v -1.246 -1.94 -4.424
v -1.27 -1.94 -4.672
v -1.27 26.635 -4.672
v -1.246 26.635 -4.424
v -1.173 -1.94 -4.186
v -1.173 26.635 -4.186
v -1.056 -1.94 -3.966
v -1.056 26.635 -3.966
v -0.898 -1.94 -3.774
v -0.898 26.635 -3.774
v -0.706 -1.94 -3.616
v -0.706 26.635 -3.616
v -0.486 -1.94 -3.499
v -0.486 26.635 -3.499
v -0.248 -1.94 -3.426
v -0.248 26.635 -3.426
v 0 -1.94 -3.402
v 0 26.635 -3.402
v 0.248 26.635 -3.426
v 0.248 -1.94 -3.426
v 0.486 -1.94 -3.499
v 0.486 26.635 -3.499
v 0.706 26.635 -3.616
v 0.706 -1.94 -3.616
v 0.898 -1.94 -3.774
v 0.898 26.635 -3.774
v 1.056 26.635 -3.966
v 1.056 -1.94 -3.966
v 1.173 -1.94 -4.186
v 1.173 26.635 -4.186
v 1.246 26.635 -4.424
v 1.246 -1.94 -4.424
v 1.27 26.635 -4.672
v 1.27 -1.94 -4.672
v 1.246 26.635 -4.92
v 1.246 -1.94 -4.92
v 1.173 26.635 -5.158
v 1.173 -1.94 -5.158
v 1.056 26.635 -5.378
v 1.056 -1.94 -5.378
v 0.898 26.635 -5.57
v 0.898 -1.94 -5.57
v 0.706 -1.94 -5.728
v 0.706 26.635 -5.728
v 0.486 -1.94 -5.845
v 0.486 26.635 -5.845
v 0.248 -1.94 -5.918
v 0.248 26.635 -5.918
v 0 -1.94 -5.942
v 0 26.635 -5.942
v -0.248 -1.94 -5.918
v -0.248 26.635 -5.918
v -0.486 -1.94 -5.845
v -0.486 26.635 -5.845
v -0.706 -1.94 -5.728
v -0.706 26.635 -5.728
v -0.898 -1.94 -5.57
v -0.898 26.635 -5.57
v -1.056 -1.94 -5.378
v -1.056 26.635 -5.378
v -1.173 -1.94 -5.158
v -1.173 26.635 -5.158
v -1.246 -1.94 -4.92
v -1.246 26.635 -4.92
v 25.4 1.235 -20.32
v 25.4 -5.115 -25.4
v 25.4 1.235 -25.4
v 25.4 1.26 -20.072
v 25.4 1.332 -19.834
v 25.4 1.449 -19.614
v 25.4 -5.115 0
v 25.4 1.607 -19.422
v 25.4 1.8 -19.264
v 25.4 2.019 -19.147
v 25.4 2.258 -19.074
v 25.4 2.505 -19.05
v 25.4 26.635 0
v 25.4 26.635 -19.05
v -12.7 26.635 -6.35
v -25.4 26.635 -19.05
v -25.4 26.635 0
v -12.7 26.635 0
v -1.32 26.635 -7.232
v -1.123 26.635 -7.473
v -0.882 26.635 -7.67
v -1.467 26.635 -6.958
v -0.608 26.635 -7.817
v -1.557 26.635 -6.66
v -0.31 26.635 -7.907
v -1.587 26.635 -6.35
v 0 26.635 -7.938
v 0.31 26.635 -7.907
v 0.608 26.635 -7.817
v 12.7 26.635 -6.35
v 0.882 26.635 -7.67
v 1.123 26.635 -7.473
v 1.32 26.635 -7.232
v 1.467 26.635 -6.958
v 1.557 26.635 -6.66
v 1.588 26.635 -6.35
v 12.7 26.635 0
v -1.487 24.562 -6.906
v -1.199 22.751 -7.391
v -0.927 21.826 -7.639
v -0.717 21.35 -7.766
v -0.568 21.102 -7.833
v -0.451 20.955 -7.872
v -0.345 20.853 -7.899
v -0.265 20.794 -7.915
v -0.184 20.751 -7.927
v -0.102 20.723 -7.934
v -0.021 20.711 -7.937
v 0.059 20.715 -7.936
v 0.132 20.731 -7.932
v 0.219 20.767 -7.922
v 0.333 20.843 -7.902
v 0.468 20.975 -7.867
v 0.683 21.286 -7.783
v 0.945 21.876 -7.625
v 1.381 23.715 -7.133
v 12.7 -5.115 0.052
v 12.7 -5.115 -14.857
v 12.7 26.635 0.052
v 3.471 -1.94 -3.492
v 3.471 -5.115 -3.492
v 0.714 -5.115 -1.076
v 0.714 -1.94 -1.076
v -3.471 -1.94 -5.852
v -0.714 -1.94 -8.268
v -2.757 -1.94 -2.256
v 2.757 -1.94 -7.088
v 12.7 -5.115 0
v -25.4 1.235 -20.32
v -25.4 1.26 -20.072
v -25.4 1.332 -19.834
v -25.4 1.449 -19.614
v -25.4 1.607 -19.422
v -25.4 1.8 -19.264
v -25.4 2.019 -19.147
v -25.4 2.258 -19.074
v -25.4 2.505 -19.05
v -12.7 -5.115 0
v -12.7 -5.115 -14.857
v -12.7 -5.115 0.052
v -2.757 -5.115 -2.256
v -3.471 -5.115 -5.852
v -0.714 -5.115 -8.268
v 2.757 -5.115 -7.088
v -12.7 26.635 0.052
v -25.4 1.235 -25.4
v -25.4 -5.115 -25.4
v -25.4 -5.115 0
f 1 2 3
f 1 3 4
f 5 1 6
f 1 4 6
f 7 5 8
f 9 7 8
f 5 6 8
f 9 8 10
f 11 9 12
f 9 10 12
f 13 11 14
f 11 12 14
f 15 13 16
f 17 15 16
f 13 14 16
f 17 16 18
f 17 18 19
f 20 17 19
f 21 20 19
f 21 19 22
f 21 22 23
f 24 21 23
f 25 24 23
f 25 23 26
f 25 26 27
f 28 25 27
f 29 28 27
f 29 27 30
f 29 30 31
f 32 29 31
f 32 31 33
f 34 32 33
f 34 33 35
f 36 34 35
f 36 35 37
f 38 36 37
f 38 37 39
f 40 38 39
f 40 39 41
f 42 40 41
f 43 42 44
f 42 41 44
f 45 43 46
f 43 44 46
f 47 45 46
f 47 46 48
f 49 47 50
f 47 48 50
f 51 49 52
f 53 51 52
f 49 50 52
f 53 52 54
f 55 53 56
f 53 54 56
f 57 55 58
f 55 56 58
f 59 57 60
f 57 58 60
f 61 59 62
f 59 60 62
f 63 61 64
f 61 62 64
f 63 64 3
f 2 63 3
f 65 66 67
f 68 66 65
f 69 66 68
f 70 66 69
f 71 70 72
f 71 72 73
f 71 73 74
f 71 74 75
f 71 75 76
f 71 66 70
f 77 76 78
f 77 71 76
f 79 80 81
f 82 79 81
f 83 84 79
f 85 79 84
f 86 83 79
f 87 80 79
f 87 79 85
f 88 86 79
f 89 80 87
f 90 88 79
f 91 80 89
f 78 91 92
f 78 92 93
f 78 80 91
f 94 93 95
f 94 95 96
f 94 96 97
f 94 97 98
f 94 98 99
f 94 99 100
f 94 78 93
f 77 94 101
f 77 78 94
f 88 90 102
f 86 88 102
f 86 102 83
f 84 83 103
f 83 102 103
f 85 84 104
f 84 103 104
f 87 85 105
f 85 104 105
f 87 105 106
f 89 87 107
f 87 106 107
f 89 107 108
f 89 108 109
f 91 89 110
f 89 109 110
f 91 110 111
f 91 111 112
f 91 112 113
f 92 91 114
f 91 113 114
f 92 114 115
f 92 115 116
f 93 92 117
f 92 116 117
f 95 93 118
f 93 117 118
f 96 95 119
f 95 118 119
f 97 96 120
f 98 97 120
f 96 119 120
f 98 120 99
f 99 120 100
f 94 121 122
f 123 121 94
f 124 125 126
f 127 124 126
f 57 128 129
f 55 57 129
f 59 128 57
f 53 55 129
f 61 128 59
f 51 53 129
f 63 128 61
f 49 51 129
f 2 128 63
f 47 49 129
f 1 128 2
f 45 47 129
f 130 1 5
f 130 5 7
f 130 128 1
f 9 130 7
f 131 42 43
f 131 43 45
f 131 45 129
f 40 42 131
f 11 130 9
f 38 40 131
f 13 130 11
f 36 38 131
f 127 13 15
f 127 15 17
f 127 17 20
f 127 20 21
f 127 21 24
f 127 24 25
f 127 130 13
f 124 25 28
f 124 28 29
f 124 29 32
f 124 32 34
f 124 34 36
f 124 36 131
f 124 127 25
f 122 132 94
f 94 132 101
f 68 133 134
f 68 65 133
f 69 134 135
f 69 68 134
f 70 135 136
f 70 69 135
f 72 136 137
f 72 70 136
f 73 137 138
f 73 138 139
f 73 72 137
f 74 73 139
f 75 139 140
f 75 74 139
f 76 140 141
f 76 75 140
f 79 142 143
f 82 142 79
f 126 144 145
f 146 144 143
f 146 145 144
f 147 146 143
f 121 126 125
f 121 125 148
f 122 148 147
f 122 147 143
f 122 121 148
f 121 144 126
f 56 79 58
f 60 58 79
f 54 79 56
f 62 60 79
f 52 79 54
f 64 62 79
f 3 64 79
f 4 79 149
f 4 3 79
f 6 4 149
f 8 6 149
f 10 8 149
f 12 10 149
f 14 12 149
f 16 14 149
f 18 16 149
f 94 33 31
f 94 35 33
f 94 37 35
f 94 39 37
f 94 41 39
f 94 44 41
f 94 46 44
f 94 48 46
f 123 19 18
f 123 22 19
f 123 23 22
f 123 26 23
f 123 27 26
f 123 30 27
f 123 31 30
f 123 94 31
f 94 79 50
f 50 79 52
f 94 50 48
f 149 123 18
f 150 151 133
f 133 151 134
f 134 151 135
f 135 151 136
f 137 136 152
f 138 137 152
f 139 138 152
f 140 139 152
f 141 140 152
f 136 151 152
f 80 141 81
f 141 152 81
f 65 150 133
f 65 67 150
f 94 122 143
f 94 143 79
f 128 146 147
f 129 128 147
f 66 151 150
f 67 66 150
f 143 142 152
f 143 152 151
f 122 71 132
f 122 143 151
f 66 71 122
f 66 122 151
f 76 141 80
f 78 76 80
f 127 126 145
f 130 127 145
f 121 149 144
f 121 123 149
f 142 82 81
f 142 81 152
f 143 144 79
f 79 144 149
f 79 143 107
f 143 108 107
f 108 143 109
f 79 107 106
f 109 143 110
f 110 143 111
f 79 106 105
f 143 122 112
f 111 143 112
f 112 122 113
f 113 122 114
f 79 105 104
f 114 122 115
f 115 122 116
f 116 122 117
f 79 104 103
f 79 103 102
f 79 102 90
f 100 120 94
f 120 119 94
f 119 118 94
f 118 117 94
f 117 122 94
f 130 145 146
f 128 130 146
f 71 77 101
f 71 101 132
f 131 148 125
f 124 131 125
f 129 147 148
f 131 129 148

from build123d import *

# Parameters (mm, degrees)
F1_DEPTH  = 25.4
F3_DEPTH  = 12.7
F5_D      = 3.175
F7_R      = 1.27
F8_DEPTH  = 12.7
F10_D     = 2.54
F12_DEPTH = 3.175


with BuildPart() as f1:
    # F0 (on Right) → F1 (new body, symmetric)
    with BuildSketch(Plane.YZ):
        Polygon((-5.114724, 0), (-5.114724, -25.4), (1.235276, -25.4), (1.235276, -19.05), (26.635276, -19.05), (26.635276, 0), align=None)
    extrude(amount=F1_DEPTH, both=True)

    # F2 (on Right) → F3 (cut, symmetric)
    with BuildSketch(Plane.YZ):
        Polygon((26.635276, 0), (-5.114724, 0), (-5.114724, -14.857387), (26.635276, -6.35), align=None)
    extrude(amount=F3_DEPTH, both=True, mode=Mode.SUBTRACT)

    # F5 (through all)
    with Locations(Plane(origin=(0, 26.635276, 0), x_dir=(-1, 0, 0), z_dir=(0, 1, 0))):
        with Locations((0, -6.35)):
            Hole(F5_D / 2)

    # F7
    f7_edges = [f1.edges().sort_by_distance(p)[0] for p in [
        (0, 1.235276, -19.05),
    ]]
    fillet(f7_edges, radius=F7_R)


with BuildPart() as f8:
    # F6 (on Right) → F8 (new body, symmetric)
    with BuildSketch(Plane.YZ):
        Polygon((-5.114724, 0.052499), (-5.114724, -14.857387), (26.635276, -6.35), (26.635276, 0.052499), align=None)
    extrude(amount=F8_DEPTH, both=True)

    # F10 (through all)
    with Locations(Plane.XZ.offset(5.114724)):
        with Locations((0, -4.671995)):
            Hole(F10_D / 2)

    # F11 (on face) → F12 (cut)
    with BuildSketch(Plane.XZ.offset(5.114724)):
        Polygon((3.47121, -3.492362), (0.714013, -1.076022), (-2.757197, -2.255655), (-3.47121, -5.851627), (-0.714013, -8.267967), (2.757197, -7.088334), align=None)
    extrude(amount=-F12_DEPTH, mode=Mode.SUBTRACT)


solid = Compound([f1.part, f8.part])
